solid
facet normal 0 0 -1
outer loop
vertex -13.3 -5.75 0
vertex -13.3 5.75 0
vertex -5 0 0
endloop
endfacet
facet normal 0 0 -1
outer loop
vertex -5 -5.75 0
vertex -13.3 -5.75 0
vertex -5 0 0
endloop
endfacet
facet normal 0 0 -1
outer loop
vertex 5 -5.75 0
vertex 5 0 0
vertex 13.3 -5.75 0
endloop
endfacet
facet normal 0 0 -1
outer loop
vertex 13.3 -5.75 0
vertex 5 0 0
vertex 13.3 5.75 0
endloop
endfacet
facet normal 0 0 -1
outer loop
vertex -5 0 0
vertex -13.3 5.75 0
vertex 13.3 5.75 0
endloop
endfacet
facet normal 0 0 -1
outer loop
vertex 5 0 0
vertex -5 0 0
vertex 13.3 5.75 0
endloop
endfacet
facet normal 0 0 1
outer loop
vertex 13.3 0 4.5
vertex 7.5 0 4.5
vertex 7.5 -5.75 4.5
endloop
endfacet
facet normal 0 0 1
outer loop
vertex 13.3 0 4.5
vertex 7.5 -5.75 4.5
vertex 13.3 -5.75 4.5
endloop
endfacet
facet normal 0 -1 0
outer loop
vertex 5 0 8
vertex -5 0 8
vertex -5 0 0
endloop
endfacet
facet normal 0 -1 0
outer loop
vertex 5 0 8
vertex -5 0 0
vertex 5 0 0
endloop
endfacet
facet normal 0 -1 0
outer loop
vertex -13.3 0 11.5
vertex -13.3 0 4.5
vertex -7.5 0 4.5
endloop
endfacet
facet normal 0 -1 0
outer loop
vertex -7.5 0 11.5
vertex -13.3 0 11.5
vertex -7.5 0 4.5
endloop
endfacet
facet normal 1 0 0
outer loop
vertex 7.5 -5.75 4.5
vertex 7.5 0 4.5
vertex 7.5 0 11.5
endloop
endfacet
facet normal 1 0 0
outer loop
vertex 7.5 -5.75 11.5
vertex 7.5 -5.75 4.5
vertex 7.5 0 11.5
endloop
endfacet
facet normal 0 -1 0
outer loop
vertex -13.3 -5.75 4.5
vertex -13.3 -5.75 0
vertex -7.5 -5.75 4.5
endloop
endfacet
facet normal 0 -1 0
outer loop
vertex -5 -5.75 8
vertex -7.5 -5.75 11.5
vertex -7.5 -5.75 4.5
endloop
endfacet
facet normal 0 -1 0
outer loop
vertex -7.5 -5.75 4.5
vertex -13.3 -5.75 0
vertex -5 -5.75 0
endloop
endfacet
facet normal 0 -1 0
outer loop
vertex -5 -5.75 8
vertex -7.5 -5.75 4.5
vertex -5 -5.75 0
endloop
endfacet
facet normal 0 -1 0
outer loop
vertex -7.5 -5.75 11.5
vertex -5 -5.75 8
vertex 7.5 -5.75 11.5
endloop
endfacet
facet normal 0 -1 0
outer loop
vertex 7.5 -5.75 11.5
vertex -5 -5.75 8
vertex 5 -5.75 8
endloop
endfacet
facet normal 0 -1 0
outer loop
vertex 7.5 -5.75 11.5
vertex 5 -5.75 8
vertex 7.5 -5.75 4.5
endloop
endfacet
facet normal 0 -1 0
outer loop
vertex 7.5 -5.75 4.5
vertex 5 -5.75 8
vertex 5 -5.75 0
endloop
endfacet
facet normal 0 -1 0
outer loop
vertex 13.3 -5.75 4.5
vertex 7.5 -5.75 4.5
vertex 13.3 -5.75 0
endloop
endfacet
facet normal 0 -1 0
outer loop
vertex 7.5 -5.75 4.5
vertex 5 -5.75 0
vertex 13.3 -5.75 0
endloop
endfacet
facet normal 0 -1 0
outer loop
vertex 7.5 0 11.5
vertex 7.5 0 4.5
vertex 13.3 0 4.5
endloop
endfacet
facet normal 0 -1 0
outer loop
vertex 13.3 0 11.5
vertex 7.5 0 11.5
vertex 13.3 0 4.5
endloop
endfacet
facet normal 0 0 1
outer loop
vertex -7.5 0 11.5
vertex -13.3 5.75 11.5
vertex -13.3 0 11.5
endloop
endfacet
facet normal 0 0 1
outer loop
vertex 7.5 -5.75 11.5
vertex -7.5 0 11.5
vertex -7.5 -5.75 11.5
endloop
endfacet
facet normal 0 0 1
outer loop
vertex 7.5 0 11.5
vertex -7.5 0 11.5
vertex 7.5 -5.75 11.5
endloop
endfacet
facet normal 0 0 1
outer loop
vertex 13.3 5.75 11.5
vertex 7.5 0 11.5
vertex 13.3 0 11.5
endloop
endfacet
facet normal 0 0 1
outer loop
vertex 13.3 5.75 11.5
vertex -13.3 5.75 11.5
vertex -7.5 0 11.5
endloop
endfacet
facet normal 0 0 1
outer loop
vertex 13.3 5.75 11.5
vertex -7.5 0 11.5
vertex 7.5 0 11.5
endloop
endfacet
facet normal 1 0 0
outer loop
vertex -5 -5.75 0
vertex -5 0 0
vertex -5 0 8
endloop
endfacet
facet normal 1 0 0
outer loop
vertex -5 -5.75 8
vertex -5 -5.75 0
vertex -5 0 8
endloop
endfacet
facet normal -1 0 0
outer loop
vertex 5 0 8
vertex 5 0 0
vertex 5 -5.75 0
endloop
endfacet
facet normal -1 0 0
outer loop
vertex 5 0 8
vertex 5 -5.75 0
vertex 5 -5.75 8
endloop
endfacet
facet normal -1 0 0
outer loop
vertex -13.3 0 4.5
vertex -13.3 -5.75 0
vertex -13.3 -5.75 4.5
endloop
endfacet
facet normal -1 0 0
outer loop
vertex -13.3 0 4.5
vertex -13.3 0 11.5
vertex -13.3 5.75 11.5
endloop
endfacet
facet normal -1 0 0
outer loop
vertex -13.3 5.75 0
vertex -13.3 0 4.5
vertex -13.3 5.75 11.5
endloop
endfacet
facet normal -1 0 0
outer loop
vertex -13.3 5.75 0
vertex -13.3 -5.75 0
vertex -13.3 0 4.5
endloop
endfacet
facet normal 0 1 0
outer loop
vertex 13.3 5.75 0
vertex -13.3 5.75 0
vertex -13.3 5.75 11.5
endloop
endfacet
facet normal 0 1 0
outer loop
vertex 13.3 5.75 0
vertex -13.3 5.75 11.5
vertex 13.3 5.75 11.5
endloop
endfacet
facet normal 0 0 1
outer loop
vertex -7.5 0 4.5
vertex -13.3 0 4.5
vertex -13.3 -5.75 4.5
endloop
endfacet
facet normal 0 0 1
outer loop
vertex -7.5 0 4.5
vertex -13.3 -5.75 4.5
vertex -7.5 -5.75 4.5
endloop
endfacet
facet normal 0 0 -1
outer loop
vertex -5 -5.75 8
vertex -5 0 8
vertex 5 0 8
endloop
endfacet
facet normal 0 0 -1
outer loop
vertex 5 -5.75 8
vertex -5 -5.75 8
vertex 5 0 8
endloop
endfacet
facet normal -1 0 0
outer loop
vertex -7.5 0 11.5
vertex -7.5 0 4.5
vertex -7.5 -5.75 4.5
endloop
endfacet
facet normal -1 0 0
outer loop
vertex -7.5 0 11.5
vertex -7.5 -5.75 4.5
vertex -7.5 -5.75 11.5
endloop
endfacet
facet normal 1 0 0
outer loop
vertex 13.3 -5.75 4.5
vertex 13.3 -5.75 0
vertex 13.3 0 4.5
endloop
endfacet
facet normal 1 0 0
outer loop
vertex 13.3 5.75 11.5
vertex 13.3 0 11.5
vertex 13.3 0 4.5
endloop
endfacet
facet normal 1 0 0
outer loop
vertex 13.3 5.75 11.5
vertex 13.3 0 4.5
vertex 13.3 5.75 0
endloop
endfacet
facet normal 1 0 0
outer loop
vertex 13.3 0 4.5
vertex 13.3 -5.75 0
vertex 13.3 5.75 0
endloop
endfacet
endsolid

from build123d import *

# Parameters (mm, degrees)
F0_W     = 26.6
F0_H     = 11.5
F1_DEPTH = 11.5
F2_W     = 5.8
F2_H     = 7
F2_W_2   = 10
F2_H_2   = 8
F3_DEPTH = 5.751


with BuildPart() as f1:
    # F0 (on Top) → F1 (new body)
    with BuildSketch(Plane.XY):
        Rectangle(F0_W, F0_H)
    extrude(amount=F1_DEPTH)

    # F2 (on Front) → F3 (cut, through all)
    with BuildSketch(Plane.XZ):
        with Locations((-10.4, 8)):
            Rectangle(F2_W, F2_H)
        with Locations((10.4, 8)):
            Rectangle(F2_W, F2_H)
        with Locations((0, 4)):
            Rectangle(F2_W_2, F2_H_2)
    extrude(amount=F3_DEPTH, mode=Mode.SUBTRACT)


solid = f1.part
